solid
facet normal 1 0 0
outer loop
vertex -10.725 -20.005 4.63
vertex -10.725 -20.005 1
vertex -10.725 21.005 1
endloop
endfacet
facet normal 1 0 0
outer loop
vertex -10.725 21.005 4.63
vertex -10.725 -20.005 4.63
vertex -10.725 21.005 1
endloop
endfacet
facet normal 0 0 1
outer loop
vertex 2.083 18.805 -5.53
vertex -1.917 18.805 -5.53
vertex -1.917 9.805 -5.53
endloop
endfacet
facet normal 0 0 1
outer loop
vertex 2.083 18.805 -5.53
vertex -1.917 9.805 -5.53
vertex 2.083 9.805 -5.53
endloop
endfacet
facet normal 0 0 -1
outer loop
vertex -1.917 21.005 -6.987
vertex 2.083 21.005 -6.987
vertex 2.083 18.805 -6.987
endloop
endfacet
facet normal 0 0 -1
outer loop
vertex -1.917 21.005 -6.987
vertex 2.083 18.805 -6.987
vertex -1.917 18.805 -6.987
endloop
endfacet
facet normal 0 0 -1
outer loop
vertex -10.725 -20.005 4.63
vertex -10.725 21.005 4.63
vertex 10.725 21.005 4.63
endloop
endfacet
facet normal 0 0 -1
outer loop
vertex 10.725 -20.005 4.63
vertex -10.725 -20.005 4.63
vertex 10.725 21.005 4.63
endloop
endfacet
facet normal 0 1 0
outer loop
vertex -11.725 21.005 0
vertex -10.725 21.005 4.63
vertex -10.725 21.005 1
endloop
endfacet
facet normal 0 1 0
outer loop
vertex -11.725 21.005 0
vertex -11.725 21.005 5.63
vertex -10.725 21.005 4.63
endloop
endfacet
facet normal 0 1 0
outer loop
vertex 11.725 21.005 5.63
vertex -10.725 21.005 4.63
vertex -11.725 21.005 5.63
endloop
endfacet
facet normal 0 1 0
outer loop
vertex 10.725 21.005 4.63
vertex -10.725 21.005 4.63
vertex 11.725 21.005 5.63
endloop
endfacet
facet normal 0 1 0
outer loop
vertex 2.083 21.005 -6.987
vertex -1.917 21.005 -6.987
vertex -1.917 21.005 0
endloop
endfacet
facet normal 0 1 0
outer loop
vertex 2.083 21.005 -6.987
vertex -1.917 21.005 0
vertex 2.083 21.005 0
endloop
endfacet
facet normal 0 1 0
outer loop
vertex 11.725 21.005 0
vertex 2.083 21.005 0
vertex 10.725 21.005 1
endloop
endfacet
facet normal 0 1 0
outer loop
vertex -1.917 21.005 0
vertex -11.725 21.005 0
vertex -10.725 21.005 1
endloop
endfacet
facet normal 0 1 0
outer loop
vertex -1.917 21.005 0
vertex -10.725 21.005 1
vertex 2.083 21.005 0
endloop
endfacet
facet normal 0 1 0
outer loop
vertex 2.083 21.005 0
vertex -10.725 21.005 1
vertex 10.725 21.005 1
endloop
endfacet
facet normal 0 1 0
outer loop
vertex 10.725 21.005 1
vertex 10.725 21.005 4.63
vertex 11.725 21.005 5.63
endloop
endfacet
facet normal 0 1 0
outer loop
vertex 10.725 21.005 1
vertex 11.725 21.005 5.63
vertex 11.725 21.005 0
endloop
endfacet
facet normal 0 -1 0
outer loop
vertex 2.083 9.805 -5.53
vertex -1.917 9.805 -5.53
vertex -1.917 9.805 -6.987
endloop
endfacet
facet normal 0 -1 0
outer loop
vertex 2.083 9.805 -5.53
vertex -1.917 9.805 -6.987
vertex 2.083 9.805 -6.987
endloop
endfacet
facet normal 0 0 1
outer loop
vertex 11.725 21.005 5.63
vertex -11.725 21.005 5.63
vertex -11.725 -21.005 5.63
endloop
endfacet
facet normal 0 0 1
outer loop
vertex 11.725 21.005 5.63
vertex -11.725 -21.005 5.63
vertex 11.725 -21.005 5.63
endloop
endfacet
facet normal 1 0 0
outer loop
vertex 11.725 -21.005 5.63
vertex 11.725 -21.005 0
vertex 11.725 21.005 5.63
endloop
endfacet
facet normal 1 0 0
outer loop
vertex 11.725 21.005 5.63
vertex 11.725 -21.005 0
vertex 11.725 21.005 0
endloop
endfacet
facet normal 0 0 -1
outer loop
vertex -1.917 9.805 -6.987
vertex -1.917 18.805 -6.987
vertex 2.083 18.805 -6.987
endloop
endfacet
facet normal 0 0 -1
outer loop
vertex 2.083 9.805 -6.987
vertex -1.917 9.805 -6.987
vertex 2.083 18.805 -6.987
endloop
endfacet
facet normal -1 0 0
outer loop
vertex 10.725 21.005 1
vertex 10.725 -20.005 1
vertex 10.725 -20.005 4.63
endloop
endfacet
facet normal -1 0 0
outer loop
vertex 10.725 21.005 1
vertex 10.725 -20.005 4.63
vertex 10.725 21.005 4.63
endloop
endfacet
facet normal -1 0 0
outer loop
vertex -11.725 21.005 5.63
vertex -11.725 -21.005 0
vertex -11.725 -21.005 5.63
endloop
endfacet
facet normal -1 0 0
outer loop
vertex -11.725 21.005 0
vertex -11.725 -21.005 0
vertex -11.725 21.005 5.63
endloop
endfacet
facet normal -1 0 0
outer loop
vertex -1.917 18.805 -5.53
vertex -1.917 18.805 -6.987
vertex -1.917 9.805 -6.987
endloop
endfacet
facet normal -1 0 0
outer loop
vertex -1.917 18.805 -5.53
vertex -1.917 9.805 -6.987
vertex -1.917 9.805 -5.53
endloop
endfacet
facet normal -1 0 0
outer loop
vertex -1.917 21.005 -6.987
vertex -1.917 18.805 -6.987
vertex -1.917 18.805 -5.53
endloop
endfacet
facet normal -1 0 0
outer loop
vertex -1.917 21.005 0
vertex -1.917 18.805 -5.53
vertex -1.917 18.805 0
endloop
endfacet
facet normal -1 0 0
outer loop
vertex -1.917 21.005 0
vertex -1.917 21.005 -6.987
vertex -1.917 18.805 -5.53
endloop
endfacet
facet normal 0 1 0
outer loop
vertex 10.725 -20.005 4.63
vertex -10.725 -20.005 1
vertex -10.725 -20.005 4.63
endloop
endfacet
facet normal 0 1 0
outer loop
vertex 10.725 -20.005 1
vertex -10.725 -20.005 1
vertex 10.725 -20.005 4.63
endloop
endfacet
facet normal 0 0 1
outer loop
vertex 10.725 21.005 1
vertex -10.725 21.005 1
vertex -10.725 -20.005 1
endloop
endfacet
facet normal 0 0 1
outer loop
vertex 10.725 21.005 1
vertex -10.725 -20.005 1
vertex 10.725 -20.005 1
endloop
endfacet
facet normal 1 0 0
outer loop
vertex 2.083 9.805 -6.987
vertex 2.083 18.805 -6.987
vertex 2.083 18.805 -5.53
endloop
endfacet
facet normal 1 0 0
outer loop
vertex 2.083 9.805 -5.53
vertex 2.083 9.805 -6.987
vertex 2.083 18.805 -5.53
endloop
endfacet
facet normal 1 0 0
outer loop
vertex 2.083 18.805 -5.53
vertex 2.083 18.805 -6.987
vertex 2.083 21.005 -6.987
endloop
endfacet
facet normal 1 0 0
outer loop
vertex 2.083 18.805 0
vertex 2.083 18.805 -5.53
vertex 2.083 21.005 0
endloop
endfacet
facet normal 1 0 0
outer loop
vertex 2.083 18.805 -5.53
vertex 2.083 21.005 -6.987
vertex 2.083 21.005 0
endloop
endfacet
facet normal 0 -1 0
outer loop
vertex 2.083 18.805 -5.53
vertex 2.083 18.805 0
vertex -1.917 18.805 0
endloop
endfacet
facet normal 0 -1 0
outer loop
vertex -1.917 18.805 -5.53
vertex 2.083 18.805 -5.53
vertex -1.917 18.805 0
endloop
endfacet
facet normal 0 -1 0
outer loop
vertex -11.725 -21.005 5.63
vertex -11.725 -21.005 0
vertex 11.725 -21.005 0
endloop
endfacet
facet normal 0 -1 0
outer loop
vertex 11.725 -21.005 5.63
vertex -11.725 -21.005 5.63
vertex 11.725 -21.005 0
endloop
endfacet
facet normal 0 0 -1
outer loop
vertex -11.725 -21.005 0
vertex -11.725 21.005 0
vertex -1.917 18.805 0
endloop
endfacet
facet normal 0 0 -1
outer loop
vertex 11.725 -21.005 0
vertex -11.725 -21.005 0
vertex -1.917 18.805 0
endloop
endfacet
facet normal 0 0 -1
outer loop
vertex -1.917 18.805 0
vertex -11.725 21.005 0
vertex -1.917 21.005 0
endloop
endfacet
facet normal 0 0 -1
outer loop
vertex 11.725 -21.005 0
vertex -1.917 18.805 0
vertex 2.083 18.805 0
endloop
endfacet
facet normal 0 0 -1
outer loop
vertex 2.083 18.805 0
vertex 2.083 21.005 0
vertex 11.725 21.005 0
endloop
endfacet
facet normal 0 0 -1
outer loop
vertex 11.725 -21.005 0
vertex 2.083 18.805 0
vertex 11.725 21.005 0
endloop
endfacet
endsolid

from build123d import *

# Parameters (mm, degrees)
F0_W     = 23.45
F0_H     = 42.01
F1_DEPTH = 5.63
F2_T     = -1
F3_W     = 4
F3_H     = 6.987
F4_DEPTH = 2.2
F5_W     = 4
F5_H     = 1.456921
F6_DEPTH = 9


with BuildPart() as f1:
    # F0 (on Top) → F1 (new body)
    with BuildSketch(Plane.XY):
        Rectangle(F0_W, F0_H)
    extrude(amount=F1_DEPTH)

    # F2
    f2_openings = [f1.faces().sort_by_distance(p)[0] for p in [
        (0, 21.005, 2.815),
    ]]
    offset(amount=F2_T, openings=f2_openings)

    # F3 (on face) → F4 (join)
    with BuildSketch(Plane(origin=(0, 21.005, 0), x_dir=(-1, 0, 0), z_dir=(0, 1, 0))):
        with Locations((-0.08324, -3.4935)):
            Rectangle(F3_W, F3_H)
    extrude(amount=-F4_DEPTH)

    # F5 (on face) → F6 (join)
    with BuildSketch(Plane.XZ.offset(-18.805)):
        with Locations((0.08324, -6.258539)):
            Rectangle(F5_W, F5_H)
    extrude(amount=F6_DEPTH)


solid = f1.part
